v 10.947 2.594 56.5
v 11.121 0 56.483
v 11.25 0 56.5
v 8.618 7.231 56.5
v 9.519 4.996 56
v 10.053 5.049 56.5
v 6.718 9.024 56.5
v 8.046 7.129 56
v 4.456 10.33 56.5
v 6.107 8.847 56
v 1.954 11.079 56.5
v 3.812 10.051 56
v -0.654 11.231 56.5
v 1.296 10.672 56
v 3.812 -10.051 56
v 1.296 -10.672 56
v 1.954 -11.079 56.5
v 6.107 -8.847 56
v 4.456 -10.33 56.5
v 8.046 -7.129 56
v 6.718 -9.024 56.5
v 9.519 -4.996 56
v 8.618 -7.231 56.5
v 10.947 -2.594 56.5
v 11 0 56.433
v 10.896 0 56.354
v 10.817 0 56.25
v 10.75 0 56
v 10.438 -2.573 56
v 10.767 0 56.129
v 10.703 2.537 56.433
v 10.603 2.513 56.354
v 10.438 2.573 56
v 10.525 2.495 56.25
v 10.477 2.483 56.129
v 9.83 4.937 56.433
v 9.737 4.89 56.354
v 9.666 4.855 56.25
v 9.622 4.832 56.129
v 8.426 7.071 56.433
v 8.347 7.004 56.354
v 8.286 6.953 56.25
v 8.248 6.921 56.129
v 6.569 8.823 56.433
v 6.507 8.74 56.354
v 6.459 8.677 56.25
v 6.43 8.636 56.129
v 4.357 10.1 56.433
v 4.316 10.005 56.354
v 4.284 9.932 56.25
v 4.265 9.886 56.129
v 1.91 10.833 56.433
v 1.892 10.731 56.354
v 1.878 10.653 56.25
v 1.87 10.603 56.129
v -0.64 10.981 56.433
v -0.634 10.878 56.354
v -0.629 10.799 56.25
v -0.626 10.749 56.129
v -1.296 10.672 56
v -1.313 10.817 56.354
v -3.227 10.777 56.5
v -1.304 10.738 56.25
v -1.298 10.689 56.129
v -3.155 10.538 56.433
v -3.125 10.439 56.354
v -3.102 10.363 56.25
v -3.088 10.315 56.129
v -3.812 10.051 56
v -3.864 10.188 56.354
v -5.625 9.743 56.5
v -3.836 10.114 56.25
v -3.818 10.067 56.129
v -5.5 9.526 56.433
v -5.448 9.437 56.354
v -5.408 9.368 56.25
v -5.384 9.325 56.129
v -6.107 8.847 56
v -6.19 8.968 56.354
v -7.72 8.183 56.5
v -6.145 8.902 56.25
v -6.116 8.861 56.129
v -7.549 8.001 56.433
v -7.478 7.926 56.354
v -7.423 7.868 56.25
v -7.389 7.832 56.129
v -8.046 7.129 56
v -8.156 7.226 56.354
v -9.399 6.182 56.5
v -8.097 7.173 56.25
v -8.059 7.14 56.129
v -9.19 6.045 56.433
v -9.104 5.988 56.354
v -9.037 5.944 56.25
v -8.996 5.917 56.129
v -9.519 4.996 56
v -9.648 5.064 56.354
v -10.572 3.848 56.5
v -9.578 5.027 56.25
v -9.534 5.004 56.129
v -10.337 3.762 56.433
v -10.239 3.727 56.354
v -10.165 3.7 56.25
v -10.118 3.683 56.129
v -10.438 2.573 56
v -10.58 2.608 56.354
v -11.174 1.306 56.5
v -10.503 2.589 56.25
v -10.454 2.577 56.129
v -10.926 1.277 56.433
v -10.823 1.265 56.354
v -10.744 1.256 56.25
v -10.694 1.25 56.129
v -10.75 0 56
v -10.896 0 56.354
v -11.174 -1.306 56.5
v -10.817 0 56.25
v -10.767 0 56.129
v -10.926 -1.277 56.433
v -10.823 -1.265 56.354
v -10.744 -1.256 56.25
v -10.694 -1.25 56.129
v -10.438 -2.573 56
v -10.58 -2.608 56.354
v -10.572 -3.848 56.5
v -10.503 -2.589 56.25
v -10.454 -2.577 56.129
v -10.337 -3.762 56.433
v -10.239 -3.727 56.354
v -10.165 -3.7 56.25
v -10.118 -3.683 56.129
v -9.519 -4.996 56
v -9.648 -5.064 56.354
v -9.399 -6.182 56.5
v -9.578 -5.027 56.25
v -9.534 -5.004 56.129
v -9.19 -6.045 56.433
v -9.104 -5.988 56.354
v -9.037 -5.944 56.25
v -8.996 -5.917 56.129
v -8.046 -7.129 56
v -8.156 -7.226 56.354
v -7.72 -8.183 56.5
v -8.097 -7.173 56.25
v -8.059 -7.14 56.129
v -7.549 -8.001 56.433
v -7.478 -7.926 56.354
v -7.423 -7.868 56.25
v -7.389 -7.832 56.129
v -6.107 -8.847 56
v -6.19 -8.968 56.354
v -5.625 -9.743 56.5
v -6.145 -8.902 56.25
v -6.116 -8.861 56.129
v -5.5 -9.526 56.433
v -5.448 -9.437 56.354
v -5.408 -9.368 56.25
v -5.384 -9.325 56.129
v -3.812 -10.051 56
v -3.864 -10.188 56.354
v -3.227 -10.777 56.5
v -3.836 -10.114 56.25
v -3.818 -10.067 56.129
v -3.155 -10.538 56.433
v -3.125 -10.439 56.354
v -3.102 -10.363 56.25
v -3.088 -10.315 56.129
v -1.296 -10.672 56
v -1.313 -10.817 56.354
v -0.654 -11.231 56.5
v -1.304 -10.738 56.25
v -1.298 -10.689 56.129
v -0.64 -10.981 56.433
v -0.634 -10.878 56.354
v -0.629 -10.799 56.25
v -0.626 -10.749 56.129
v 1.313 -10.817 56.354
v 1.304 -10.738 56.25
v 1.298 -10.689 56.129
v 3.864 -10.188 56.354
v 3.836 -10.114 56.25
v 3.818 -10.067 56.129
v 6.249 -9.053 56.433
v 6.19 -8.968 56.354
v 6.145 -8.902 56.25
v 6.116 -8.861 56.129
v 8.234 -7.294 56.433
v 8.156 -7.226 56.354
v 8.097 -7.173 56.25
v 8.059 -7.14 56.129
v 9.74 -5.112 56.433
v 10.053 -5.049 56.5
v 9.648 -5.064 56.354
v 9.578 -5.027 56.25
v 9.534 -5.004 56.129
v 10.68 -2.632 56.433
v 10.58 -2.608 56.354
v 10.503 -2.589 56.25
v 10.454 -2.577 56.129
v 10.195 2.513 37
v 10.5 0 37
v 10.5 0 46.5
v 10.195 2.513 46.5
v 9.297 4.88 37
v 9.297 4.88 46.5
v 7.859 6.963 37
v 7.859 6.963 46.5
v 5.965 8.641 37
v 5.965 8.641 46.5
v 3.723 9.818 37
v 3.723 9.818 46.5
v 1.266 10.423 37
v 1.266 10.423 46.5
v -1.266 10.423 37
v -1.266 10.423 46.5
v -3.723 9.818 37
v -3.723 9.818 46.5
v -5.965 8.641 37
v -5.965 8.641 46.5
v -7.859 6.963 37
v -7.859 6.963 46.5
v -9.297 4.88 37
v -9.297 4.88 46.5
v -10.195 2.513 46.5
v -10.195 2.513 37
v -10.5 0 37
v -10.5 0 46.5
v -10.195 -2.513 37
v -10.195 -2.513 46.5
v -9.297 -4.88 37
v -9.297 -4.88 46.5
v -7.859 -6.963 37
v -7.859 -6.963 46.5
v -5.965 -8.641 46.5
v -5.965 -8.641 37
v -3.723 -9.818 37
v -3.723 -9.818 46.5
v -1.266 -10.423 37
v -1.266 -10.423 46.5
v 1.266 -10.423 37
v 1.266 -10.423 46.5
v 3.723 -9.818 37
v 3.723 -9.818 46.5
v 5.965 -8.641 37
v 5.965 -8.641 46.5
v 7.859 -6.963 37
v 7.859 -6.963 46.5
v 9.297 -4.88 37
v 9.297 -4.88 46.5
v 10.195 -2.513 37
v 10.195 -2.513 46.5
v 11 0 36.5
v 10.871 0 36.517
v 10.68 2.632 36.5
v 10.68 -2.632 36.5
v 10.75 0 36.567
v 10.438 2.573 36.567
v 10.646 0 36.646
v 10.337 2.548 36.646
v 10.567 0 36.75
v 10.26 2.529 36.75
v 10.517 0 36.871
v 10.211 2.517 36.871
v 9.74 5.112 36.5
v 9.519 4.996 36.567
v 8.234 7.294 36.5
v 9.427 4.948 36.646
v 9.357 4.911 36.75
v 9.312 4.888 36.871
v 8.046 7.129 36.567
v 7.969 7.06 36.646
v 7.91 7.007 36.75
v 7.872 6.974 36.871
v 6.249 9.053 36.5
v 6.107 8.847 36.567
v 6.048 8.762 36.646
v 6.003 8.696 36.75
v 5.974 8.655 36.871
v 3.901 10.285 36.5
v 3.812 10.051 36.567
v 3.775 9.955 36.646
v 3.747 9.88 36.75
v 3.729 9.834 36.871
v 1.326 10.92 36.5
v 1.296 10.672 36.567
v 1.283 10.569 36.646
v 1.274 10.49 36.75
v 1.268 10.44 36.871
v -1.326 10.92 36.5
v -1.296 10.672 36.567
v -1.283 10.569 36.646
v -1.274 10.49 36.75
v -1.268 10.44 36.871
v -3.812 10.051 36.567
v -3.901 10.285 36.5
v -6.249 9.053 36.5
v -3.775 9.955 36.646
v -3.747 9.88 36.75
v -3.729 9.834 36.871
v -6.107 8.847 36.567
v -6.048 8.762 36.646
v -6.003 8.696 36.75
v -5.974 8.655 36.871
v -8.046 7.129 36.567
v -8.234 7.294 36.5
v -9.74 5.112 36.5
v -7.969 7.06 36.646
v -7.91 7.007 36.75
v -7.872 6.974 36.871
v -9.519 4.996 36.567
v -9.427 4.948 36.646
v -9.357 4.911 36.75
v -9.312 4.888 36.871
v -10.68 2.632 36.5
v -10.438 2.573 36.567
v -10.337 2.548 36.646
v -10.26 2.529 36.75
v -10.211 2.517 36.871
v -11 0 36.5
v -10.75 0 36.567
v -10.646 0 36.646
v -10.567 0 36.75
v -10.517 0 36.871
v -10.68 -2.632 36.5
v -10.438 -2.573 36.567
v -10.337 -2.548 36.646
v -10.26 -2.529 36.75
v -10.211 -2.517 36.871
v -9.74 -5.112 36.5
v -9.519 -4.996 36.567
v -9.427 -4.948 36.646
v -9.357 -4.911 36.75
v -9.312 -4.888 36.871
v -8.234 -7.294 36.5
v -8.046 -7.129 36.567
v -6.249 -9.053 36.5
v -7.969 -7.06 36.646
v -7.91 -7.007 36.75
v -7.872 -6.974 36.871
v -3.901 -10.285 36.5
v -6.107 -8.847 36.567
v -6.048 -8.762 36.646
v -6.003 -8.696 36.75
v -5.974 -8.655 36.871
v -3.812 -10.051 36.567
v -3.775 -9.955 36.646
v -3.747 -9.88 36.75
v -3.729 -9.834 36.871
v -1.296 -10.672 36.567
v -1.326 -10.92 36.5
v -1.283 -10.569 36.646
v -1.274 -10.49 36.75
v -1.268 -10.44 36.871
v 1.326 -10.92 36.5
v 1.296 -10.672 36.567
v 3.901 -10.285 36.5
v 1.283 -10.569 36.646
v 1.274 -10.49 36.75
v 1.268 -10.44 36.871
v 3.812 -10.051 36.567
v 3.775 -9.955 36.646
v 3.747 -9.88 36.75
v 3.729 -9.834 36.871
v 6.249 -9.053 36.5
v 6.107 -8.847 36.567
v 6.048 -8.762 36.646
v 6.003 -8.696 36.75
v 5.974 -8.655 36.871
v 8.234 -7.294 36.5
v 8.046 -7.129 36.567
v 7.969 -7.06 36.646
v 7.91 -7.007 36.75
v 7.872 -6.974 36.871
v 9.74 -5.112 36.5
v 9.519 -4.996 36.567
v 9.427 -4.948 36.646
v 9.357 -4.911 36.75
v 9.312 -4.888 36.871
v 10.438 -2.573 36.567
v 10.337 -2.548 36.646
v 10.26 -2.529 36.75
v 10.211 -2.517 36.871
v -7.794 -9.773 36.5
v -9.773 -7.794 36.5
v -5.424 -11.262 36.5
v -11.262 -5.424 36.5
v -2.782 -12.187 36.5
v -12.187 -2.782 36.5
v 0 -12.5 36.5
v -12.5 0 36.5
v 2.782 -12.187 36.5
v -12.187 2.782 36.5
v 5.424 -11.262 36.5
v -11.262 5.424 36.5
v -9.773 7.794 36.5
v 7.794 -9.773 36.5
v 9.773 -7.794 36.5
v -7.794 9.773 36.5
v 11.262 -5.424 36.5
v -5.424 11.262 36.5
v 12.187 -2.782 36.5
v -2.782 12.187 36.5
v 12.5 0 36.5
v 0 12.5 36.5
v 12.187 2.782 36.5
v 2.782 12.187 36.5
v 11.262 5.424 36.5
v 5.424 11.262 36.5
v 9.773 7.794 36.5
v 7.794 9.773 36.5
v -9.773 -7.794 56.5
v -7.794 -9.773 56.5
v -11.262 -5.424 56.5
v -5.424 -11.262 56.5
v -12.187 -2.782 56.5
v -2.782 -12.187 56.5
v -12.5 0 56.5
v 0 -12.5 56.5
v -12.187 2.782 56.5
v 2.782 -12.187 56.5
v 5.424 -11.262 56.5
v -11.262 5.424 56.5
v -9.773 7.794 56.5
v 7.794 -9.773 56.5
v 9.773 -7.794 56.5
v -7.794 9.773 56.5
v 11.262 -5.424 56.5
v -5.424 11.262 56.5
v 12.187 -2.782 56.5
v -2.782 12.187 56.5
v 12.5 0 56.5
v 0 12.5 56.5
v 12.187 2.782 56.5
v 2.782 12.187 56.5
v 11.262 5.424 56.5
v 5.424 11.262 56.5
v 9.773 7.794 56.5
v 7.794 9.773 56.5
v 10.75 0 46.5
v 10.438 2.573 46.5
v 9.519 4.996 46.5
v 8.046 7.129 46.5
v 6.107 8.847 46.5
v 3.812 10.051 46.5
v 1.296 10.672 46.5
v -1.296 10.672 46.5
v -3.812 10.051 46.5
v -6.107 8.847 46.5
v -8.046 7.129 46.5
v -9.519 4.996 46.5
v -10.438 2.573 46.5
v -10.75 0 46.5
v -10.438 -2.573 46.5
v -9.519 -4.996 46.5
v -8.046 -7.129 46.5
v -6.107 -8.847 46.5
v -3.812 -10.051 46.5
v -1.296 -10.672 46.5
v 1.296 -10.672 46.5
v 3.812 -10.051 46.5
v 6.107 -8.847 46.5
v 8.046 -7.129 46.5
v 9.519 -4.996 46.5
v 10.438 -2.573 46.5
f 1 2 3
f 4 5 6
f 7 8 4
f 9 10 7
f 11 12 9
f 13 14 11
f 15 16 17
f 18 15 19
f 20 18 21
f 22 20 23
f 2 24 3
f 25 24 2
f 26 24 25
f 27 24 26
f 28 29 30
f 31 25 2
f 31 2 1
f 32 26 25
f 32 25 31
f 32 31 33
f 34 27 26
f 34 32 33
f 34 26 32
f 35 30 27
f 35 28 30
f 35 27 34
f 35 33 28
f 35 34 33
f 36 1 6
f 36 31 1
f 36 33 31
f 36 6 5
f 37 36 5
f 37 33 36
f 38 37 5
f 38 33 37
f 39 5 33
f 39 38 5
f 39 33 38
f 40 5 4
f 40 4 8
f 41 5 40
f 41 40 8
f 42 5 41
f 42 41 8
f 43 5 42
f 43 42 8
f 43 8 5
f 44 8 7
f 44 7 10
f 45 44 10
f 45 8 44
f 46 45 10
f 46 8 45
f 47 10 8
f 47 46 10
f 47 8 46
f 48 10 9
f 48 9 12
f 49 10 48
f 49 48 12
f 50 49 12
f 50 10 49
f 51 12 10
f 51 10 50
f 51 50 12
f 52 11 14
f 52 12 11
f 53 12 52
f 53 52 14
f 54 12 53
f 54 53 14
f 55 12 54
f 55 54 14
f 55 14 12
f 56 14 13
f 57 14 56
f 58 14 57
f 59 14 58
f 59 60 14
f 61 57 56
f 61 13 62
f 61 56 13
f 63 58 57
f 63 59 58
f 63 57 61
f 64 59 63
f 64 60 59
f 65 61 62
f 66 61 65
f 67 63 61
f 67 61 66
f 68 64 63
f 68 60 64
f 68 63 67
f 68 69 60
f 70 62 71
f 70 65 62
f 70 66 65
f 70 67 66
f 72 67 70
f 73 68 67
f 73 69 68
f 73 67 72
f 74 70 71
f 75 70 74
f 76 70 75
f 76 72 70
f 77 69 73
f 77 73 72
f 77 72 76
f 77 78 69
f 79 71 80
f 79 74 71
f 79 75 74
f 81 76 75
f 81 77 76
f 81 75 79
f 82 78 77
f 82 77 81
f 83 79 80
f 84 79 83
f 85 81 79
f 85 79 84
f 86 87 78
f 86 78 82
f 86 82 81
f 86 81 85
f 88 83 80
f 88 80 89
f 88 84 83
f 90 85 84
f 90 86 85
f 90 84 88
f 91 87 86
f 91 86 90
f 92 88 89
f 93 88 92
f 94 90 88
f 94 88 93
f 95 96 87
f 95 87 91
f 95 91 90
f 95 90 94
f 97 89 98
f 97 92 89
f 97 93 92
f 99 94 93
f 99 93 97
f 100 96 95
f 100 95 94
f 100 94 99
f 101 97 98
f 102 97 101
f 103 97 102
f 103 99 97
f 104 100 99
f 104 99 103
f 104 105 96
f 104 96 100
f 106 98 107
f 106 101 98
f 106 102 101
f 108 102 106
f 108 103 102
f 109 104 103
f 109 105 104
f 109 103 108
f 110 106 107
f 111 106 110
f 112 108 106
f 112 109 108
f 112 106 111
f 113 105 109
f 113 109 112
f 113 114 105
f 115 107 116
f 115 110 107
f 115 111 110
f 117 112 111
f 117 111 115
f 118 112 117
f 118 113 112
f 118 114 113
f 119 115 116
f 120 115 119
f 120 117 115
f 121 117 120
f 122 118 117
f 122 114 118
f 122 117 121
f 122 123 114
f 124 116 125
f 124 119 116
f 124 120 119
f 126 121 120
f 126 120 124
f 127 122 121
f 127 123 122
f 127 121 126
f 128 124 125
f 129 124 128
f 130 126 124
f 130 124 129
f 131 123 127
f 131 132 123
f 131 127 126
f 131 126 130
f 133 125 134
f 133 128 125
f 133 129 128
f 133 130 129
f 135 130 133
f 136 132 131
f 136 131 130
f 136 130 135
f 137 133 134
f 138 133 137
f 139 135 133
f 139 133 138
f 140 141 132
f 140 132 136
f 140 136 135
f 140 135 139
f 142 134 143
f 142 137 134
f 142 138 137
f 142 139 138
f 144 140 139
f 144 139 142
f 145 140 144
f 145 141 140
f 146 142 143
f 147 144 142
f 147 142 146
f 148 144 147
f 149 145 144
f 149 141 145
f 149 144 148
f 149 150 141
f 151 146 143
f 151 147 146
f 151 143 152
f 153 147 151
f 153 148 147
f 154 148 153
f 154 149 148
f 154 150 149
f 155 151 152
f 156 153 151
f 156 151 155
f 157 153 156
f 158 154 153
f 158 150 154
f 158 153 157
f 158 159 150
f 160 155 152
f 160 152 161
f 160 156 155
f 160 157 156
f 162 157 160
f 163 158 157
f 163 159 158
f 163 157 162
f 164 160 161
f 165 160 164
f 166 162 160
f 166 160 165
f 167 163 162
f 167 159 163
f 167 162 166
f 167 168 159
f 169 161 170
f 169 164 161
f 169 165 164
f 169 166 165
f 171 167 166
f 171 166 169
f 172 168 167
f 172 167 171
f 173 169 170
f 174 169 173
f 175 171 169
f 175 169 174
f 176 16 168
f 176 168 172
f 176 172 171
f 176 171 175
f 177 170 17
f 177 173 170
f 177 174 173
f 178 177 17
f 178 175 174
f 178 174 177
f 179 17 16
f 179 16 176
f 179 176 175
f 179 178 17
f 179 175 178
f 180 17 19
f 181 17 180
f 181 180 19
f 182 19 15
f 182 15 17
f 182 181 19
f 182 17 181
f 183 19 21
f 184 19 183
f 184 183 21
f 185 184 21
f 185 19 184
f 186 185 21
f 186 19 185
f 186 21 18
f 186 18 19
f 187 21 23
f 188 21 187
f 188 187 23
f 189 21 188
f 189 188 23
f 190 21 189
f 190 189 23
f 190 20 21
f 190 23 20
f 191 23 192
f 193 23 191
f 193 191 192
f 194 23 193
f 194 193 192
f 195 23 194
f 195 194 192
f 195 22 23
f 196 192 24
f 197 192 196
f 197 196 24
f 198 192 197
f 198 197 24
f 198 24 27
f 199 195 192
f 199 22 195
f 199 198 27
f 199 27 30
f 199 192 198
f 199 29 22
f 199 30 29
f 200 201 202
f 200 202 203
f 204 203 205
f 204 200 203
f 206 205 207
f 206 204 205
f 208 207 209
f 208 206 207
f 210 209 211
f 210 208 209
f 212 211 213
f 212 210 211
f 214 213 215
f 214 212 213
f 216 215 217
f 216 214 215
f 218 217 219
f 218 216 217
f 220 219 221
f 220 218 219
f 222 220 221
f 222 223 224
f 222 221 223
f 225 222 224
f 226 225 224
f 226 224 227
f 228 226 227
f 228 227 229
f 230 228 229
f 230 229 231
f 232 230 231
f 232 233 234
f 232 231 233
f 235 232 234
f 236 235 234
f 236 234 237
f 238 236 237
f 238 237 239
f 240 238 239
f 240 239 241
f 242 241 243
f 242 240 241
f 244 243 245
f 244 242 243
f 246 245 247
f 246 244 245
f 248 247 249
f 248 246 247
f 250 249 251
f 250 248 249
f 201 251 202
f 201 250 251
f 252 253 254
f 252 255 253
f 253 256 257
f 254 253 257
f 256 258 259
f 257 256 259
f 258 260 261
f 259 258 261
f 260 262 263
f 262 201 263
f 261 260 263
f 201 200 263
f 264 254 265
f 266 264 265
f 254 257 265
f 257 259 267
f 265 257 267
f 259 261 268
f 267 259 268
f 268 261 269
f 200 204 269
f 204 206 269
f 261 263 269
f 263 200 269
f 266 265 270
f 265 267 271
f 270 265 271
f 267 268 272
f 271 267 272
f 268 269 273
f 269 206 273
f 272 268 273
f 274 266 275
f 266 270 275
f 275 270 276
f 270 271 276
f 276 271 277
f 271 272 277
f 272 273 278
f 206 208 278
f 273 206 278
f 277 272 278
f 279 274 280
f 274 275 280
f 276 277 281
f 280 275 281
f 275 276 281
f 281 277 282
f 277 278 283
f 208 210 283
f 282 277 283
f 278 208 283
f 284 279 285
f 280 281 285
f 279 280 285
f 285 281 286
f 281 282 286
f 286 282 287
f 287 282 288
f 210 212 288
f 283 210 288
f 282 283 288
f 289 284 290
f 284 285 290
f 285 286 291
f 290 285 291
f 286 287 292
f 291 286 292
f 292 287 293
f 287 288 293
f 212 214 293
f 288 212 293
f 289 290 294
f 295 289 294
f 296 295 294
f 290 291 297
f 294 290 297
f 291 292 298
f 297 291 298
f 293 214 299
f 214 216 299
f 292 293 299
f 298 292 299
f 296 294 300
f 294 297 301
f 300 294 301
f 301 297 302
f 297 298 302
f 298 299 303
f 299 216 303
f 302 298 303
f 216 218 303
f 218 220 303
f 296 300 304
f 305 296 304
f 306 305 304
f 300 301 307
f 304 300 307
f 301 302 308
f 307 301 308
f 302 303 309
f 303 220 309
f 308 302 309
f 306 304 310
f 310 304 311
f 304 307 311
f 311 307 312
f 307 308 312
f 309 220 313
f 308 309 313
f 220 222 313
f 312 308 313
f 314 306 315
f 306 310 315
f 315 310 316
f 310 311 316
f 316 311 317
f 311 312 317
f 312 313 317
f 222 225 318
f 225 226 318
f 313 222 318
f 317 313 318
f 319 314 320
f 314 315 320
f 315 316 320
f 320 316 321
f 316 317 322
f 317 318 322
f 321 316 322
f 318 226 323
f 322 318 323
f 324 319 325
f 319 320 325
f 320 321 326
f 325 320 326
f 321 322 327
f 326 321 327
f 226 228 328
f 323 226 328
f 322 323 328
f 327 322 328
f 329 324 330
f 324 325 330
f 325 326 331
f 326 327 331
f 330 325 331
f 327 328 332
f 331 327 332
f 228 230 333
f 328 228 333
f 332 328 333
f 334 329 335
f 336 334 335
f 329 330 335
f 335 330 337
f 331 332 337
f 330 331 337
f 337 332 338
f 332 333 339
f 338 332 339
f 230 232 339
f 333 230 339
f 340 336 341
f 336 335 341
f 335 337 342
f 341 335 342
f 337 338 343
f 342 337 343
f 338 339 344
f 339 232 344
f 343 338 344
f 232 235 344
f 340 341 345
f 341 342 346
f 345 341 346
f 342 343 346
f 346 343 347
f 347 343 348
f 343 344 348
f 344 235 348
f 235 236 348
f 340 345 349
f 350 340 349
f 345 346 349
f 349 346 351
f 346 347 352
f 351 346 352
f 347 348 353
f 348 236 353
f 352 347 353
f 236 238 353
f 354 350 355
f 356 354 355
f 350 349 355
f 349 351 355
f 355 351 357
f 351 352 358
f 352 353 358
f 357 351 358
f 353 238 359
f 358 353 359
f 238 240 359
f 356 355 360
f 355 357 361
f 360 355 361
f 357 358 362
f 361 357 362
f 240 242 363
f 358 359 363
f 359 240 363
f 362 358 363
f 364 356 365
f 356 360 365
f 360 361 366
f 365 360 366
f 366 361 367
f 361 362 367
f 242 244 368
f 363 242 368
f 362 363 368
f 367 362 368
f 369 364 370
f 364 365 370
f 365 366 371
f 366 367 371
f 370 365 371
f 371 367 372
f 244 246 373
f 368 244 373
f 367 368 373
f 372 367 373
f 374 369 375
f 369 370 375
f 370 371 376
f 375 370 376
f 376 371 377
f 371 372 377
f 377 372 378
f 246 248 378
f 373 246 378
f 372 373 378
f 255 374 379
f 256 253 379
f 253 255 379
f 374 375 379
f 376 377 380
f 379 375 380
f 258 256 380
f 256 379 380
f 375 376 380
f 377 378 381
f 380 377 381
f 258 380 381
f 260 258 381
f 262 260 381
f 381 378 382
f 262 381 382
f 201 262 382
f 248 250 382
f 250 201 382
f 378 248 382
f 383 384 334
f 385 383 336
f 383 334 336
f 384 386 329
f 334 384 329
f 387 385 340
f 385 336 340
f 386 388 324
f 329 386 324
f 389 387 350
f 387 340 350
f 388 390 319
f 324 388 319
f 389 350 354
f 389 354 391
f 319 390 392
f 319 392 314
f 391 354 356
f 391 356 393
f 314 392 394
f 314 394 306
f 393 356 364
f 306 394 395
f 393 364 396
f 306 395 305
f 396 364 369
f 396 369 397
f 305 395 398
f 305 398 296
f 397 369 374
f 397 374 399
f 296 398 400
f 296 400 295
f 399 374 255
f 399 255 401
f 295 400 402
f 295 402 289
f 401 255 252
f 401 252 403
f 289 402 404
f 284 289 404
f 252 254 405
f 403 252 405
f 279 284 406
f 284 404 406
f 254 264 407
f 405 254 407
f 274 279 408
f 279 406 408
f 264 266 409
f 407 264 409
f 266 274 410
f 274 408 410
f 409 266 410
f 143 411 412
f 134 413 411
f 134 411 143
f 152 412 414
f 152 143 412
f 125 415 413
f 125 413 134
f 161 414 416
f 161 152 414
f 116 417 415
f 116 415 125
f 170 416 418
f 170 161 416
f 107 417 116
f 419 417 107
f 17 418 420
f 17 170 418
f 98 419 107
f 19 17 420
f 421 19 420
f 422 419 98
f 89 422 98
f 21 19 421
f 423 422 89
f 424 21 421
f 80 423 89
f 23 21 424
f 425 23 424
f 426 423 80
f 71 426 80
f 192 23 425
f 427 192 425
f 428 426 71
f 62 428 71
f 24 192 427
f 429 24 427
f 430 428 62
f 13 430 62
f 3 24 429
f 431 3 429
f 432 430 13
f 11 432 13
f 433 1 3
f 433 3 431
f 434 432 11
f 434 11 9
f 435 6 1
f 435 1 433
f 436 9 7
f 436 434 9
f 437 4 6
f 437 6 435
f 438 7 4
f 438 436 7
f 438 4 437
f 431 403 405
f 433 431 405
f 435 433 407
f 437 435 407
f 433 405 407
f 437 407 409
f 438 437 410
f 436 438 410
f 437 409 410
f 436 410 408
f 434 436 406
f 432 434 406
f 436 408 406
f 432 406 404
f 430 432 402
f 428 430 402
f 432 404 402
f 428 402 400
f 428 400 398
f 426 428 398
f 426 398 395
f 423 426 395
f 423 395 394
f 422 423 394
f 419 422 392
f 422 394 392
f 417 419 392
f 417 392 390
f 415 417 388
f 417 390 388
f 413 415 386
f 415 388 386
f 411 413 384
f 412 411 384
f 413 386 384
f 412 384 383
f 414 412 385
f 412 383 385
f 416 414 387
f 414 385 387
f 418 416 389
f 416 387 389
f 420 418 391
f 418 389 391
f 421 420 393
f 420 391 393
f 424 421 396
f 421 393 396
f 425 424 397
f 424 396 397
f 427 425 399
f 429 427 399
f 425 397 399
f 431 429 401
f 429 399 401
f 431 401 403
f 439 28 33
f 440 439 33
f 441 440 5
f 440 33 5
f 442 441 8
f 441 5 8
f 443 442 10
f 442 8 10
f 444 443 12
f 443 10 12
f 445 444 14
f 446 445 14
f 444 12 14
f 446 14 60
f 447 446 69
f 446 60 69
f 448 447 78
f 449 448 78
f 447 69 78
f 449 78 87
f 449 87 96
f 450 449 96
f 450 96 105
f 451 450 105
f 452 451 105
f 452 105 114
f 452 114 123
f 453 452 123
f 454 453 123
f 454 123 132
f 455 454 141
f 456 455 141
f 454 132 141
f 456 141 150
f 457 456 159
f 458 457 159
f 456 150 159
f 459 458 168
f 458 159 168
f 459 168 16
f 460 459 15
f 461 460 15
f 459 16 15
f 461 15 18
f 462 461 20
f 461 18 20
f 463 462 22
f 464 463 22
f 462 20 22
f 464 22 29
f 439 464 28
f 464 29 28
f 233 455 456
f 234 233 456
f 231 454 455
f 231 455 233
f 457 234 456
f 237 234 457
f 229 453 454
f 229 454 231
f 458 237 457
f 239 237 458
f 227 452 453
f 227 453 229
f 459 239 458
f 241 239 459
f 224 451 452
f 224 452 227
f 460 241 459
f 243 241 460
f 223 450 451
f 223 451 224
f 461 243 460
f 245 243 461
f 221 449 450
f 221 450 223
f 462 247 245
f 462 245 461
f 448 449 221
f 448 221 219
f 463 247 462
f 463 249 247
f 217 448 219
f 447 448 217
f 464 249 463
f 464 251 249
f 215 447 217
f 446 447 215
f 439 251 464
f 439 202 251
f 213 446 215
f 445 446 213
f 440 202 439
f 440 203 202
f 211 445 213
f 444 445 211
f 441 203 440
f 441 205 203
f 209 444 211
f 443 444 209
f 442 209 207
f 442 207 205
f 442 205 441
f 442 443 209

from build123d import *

# Parameters (mm, degrees)
F1_R     = 12.5
F1_R_2   = 10.5
F2_DEPTH = 20
F3_R     = 10.75
F4_DEPTH = 10
F5_R     = 0.5


with BuildPart() as f2:
    # F1 (on offset) → F2 (new body)
    with BuildSketch(Plane.XY.offset(36.5)):
        Circle(F1_R)
        Circle(F1_R_2, mode=Mode.SUBTRACT)
    extrude(amount=F2_DEPTH)

    # F3 (on face) → F4 (cut)
    with BuildSketch(Plane.XY.offset(56.5)):
        Circle(F3_R)
    extrude(amount=-F4_DEPTH, mode=Mode.SUBTRACT)

    # F5
    f5_edges = [f2.edges().sort_by_distance(p)[0] for p in [
        (-10.75, 0, 56.5),
        (-10.5, 0, 36.5),
    ]]
    fillet(f5_edges, radius=F5_R)


solid = f2.part
